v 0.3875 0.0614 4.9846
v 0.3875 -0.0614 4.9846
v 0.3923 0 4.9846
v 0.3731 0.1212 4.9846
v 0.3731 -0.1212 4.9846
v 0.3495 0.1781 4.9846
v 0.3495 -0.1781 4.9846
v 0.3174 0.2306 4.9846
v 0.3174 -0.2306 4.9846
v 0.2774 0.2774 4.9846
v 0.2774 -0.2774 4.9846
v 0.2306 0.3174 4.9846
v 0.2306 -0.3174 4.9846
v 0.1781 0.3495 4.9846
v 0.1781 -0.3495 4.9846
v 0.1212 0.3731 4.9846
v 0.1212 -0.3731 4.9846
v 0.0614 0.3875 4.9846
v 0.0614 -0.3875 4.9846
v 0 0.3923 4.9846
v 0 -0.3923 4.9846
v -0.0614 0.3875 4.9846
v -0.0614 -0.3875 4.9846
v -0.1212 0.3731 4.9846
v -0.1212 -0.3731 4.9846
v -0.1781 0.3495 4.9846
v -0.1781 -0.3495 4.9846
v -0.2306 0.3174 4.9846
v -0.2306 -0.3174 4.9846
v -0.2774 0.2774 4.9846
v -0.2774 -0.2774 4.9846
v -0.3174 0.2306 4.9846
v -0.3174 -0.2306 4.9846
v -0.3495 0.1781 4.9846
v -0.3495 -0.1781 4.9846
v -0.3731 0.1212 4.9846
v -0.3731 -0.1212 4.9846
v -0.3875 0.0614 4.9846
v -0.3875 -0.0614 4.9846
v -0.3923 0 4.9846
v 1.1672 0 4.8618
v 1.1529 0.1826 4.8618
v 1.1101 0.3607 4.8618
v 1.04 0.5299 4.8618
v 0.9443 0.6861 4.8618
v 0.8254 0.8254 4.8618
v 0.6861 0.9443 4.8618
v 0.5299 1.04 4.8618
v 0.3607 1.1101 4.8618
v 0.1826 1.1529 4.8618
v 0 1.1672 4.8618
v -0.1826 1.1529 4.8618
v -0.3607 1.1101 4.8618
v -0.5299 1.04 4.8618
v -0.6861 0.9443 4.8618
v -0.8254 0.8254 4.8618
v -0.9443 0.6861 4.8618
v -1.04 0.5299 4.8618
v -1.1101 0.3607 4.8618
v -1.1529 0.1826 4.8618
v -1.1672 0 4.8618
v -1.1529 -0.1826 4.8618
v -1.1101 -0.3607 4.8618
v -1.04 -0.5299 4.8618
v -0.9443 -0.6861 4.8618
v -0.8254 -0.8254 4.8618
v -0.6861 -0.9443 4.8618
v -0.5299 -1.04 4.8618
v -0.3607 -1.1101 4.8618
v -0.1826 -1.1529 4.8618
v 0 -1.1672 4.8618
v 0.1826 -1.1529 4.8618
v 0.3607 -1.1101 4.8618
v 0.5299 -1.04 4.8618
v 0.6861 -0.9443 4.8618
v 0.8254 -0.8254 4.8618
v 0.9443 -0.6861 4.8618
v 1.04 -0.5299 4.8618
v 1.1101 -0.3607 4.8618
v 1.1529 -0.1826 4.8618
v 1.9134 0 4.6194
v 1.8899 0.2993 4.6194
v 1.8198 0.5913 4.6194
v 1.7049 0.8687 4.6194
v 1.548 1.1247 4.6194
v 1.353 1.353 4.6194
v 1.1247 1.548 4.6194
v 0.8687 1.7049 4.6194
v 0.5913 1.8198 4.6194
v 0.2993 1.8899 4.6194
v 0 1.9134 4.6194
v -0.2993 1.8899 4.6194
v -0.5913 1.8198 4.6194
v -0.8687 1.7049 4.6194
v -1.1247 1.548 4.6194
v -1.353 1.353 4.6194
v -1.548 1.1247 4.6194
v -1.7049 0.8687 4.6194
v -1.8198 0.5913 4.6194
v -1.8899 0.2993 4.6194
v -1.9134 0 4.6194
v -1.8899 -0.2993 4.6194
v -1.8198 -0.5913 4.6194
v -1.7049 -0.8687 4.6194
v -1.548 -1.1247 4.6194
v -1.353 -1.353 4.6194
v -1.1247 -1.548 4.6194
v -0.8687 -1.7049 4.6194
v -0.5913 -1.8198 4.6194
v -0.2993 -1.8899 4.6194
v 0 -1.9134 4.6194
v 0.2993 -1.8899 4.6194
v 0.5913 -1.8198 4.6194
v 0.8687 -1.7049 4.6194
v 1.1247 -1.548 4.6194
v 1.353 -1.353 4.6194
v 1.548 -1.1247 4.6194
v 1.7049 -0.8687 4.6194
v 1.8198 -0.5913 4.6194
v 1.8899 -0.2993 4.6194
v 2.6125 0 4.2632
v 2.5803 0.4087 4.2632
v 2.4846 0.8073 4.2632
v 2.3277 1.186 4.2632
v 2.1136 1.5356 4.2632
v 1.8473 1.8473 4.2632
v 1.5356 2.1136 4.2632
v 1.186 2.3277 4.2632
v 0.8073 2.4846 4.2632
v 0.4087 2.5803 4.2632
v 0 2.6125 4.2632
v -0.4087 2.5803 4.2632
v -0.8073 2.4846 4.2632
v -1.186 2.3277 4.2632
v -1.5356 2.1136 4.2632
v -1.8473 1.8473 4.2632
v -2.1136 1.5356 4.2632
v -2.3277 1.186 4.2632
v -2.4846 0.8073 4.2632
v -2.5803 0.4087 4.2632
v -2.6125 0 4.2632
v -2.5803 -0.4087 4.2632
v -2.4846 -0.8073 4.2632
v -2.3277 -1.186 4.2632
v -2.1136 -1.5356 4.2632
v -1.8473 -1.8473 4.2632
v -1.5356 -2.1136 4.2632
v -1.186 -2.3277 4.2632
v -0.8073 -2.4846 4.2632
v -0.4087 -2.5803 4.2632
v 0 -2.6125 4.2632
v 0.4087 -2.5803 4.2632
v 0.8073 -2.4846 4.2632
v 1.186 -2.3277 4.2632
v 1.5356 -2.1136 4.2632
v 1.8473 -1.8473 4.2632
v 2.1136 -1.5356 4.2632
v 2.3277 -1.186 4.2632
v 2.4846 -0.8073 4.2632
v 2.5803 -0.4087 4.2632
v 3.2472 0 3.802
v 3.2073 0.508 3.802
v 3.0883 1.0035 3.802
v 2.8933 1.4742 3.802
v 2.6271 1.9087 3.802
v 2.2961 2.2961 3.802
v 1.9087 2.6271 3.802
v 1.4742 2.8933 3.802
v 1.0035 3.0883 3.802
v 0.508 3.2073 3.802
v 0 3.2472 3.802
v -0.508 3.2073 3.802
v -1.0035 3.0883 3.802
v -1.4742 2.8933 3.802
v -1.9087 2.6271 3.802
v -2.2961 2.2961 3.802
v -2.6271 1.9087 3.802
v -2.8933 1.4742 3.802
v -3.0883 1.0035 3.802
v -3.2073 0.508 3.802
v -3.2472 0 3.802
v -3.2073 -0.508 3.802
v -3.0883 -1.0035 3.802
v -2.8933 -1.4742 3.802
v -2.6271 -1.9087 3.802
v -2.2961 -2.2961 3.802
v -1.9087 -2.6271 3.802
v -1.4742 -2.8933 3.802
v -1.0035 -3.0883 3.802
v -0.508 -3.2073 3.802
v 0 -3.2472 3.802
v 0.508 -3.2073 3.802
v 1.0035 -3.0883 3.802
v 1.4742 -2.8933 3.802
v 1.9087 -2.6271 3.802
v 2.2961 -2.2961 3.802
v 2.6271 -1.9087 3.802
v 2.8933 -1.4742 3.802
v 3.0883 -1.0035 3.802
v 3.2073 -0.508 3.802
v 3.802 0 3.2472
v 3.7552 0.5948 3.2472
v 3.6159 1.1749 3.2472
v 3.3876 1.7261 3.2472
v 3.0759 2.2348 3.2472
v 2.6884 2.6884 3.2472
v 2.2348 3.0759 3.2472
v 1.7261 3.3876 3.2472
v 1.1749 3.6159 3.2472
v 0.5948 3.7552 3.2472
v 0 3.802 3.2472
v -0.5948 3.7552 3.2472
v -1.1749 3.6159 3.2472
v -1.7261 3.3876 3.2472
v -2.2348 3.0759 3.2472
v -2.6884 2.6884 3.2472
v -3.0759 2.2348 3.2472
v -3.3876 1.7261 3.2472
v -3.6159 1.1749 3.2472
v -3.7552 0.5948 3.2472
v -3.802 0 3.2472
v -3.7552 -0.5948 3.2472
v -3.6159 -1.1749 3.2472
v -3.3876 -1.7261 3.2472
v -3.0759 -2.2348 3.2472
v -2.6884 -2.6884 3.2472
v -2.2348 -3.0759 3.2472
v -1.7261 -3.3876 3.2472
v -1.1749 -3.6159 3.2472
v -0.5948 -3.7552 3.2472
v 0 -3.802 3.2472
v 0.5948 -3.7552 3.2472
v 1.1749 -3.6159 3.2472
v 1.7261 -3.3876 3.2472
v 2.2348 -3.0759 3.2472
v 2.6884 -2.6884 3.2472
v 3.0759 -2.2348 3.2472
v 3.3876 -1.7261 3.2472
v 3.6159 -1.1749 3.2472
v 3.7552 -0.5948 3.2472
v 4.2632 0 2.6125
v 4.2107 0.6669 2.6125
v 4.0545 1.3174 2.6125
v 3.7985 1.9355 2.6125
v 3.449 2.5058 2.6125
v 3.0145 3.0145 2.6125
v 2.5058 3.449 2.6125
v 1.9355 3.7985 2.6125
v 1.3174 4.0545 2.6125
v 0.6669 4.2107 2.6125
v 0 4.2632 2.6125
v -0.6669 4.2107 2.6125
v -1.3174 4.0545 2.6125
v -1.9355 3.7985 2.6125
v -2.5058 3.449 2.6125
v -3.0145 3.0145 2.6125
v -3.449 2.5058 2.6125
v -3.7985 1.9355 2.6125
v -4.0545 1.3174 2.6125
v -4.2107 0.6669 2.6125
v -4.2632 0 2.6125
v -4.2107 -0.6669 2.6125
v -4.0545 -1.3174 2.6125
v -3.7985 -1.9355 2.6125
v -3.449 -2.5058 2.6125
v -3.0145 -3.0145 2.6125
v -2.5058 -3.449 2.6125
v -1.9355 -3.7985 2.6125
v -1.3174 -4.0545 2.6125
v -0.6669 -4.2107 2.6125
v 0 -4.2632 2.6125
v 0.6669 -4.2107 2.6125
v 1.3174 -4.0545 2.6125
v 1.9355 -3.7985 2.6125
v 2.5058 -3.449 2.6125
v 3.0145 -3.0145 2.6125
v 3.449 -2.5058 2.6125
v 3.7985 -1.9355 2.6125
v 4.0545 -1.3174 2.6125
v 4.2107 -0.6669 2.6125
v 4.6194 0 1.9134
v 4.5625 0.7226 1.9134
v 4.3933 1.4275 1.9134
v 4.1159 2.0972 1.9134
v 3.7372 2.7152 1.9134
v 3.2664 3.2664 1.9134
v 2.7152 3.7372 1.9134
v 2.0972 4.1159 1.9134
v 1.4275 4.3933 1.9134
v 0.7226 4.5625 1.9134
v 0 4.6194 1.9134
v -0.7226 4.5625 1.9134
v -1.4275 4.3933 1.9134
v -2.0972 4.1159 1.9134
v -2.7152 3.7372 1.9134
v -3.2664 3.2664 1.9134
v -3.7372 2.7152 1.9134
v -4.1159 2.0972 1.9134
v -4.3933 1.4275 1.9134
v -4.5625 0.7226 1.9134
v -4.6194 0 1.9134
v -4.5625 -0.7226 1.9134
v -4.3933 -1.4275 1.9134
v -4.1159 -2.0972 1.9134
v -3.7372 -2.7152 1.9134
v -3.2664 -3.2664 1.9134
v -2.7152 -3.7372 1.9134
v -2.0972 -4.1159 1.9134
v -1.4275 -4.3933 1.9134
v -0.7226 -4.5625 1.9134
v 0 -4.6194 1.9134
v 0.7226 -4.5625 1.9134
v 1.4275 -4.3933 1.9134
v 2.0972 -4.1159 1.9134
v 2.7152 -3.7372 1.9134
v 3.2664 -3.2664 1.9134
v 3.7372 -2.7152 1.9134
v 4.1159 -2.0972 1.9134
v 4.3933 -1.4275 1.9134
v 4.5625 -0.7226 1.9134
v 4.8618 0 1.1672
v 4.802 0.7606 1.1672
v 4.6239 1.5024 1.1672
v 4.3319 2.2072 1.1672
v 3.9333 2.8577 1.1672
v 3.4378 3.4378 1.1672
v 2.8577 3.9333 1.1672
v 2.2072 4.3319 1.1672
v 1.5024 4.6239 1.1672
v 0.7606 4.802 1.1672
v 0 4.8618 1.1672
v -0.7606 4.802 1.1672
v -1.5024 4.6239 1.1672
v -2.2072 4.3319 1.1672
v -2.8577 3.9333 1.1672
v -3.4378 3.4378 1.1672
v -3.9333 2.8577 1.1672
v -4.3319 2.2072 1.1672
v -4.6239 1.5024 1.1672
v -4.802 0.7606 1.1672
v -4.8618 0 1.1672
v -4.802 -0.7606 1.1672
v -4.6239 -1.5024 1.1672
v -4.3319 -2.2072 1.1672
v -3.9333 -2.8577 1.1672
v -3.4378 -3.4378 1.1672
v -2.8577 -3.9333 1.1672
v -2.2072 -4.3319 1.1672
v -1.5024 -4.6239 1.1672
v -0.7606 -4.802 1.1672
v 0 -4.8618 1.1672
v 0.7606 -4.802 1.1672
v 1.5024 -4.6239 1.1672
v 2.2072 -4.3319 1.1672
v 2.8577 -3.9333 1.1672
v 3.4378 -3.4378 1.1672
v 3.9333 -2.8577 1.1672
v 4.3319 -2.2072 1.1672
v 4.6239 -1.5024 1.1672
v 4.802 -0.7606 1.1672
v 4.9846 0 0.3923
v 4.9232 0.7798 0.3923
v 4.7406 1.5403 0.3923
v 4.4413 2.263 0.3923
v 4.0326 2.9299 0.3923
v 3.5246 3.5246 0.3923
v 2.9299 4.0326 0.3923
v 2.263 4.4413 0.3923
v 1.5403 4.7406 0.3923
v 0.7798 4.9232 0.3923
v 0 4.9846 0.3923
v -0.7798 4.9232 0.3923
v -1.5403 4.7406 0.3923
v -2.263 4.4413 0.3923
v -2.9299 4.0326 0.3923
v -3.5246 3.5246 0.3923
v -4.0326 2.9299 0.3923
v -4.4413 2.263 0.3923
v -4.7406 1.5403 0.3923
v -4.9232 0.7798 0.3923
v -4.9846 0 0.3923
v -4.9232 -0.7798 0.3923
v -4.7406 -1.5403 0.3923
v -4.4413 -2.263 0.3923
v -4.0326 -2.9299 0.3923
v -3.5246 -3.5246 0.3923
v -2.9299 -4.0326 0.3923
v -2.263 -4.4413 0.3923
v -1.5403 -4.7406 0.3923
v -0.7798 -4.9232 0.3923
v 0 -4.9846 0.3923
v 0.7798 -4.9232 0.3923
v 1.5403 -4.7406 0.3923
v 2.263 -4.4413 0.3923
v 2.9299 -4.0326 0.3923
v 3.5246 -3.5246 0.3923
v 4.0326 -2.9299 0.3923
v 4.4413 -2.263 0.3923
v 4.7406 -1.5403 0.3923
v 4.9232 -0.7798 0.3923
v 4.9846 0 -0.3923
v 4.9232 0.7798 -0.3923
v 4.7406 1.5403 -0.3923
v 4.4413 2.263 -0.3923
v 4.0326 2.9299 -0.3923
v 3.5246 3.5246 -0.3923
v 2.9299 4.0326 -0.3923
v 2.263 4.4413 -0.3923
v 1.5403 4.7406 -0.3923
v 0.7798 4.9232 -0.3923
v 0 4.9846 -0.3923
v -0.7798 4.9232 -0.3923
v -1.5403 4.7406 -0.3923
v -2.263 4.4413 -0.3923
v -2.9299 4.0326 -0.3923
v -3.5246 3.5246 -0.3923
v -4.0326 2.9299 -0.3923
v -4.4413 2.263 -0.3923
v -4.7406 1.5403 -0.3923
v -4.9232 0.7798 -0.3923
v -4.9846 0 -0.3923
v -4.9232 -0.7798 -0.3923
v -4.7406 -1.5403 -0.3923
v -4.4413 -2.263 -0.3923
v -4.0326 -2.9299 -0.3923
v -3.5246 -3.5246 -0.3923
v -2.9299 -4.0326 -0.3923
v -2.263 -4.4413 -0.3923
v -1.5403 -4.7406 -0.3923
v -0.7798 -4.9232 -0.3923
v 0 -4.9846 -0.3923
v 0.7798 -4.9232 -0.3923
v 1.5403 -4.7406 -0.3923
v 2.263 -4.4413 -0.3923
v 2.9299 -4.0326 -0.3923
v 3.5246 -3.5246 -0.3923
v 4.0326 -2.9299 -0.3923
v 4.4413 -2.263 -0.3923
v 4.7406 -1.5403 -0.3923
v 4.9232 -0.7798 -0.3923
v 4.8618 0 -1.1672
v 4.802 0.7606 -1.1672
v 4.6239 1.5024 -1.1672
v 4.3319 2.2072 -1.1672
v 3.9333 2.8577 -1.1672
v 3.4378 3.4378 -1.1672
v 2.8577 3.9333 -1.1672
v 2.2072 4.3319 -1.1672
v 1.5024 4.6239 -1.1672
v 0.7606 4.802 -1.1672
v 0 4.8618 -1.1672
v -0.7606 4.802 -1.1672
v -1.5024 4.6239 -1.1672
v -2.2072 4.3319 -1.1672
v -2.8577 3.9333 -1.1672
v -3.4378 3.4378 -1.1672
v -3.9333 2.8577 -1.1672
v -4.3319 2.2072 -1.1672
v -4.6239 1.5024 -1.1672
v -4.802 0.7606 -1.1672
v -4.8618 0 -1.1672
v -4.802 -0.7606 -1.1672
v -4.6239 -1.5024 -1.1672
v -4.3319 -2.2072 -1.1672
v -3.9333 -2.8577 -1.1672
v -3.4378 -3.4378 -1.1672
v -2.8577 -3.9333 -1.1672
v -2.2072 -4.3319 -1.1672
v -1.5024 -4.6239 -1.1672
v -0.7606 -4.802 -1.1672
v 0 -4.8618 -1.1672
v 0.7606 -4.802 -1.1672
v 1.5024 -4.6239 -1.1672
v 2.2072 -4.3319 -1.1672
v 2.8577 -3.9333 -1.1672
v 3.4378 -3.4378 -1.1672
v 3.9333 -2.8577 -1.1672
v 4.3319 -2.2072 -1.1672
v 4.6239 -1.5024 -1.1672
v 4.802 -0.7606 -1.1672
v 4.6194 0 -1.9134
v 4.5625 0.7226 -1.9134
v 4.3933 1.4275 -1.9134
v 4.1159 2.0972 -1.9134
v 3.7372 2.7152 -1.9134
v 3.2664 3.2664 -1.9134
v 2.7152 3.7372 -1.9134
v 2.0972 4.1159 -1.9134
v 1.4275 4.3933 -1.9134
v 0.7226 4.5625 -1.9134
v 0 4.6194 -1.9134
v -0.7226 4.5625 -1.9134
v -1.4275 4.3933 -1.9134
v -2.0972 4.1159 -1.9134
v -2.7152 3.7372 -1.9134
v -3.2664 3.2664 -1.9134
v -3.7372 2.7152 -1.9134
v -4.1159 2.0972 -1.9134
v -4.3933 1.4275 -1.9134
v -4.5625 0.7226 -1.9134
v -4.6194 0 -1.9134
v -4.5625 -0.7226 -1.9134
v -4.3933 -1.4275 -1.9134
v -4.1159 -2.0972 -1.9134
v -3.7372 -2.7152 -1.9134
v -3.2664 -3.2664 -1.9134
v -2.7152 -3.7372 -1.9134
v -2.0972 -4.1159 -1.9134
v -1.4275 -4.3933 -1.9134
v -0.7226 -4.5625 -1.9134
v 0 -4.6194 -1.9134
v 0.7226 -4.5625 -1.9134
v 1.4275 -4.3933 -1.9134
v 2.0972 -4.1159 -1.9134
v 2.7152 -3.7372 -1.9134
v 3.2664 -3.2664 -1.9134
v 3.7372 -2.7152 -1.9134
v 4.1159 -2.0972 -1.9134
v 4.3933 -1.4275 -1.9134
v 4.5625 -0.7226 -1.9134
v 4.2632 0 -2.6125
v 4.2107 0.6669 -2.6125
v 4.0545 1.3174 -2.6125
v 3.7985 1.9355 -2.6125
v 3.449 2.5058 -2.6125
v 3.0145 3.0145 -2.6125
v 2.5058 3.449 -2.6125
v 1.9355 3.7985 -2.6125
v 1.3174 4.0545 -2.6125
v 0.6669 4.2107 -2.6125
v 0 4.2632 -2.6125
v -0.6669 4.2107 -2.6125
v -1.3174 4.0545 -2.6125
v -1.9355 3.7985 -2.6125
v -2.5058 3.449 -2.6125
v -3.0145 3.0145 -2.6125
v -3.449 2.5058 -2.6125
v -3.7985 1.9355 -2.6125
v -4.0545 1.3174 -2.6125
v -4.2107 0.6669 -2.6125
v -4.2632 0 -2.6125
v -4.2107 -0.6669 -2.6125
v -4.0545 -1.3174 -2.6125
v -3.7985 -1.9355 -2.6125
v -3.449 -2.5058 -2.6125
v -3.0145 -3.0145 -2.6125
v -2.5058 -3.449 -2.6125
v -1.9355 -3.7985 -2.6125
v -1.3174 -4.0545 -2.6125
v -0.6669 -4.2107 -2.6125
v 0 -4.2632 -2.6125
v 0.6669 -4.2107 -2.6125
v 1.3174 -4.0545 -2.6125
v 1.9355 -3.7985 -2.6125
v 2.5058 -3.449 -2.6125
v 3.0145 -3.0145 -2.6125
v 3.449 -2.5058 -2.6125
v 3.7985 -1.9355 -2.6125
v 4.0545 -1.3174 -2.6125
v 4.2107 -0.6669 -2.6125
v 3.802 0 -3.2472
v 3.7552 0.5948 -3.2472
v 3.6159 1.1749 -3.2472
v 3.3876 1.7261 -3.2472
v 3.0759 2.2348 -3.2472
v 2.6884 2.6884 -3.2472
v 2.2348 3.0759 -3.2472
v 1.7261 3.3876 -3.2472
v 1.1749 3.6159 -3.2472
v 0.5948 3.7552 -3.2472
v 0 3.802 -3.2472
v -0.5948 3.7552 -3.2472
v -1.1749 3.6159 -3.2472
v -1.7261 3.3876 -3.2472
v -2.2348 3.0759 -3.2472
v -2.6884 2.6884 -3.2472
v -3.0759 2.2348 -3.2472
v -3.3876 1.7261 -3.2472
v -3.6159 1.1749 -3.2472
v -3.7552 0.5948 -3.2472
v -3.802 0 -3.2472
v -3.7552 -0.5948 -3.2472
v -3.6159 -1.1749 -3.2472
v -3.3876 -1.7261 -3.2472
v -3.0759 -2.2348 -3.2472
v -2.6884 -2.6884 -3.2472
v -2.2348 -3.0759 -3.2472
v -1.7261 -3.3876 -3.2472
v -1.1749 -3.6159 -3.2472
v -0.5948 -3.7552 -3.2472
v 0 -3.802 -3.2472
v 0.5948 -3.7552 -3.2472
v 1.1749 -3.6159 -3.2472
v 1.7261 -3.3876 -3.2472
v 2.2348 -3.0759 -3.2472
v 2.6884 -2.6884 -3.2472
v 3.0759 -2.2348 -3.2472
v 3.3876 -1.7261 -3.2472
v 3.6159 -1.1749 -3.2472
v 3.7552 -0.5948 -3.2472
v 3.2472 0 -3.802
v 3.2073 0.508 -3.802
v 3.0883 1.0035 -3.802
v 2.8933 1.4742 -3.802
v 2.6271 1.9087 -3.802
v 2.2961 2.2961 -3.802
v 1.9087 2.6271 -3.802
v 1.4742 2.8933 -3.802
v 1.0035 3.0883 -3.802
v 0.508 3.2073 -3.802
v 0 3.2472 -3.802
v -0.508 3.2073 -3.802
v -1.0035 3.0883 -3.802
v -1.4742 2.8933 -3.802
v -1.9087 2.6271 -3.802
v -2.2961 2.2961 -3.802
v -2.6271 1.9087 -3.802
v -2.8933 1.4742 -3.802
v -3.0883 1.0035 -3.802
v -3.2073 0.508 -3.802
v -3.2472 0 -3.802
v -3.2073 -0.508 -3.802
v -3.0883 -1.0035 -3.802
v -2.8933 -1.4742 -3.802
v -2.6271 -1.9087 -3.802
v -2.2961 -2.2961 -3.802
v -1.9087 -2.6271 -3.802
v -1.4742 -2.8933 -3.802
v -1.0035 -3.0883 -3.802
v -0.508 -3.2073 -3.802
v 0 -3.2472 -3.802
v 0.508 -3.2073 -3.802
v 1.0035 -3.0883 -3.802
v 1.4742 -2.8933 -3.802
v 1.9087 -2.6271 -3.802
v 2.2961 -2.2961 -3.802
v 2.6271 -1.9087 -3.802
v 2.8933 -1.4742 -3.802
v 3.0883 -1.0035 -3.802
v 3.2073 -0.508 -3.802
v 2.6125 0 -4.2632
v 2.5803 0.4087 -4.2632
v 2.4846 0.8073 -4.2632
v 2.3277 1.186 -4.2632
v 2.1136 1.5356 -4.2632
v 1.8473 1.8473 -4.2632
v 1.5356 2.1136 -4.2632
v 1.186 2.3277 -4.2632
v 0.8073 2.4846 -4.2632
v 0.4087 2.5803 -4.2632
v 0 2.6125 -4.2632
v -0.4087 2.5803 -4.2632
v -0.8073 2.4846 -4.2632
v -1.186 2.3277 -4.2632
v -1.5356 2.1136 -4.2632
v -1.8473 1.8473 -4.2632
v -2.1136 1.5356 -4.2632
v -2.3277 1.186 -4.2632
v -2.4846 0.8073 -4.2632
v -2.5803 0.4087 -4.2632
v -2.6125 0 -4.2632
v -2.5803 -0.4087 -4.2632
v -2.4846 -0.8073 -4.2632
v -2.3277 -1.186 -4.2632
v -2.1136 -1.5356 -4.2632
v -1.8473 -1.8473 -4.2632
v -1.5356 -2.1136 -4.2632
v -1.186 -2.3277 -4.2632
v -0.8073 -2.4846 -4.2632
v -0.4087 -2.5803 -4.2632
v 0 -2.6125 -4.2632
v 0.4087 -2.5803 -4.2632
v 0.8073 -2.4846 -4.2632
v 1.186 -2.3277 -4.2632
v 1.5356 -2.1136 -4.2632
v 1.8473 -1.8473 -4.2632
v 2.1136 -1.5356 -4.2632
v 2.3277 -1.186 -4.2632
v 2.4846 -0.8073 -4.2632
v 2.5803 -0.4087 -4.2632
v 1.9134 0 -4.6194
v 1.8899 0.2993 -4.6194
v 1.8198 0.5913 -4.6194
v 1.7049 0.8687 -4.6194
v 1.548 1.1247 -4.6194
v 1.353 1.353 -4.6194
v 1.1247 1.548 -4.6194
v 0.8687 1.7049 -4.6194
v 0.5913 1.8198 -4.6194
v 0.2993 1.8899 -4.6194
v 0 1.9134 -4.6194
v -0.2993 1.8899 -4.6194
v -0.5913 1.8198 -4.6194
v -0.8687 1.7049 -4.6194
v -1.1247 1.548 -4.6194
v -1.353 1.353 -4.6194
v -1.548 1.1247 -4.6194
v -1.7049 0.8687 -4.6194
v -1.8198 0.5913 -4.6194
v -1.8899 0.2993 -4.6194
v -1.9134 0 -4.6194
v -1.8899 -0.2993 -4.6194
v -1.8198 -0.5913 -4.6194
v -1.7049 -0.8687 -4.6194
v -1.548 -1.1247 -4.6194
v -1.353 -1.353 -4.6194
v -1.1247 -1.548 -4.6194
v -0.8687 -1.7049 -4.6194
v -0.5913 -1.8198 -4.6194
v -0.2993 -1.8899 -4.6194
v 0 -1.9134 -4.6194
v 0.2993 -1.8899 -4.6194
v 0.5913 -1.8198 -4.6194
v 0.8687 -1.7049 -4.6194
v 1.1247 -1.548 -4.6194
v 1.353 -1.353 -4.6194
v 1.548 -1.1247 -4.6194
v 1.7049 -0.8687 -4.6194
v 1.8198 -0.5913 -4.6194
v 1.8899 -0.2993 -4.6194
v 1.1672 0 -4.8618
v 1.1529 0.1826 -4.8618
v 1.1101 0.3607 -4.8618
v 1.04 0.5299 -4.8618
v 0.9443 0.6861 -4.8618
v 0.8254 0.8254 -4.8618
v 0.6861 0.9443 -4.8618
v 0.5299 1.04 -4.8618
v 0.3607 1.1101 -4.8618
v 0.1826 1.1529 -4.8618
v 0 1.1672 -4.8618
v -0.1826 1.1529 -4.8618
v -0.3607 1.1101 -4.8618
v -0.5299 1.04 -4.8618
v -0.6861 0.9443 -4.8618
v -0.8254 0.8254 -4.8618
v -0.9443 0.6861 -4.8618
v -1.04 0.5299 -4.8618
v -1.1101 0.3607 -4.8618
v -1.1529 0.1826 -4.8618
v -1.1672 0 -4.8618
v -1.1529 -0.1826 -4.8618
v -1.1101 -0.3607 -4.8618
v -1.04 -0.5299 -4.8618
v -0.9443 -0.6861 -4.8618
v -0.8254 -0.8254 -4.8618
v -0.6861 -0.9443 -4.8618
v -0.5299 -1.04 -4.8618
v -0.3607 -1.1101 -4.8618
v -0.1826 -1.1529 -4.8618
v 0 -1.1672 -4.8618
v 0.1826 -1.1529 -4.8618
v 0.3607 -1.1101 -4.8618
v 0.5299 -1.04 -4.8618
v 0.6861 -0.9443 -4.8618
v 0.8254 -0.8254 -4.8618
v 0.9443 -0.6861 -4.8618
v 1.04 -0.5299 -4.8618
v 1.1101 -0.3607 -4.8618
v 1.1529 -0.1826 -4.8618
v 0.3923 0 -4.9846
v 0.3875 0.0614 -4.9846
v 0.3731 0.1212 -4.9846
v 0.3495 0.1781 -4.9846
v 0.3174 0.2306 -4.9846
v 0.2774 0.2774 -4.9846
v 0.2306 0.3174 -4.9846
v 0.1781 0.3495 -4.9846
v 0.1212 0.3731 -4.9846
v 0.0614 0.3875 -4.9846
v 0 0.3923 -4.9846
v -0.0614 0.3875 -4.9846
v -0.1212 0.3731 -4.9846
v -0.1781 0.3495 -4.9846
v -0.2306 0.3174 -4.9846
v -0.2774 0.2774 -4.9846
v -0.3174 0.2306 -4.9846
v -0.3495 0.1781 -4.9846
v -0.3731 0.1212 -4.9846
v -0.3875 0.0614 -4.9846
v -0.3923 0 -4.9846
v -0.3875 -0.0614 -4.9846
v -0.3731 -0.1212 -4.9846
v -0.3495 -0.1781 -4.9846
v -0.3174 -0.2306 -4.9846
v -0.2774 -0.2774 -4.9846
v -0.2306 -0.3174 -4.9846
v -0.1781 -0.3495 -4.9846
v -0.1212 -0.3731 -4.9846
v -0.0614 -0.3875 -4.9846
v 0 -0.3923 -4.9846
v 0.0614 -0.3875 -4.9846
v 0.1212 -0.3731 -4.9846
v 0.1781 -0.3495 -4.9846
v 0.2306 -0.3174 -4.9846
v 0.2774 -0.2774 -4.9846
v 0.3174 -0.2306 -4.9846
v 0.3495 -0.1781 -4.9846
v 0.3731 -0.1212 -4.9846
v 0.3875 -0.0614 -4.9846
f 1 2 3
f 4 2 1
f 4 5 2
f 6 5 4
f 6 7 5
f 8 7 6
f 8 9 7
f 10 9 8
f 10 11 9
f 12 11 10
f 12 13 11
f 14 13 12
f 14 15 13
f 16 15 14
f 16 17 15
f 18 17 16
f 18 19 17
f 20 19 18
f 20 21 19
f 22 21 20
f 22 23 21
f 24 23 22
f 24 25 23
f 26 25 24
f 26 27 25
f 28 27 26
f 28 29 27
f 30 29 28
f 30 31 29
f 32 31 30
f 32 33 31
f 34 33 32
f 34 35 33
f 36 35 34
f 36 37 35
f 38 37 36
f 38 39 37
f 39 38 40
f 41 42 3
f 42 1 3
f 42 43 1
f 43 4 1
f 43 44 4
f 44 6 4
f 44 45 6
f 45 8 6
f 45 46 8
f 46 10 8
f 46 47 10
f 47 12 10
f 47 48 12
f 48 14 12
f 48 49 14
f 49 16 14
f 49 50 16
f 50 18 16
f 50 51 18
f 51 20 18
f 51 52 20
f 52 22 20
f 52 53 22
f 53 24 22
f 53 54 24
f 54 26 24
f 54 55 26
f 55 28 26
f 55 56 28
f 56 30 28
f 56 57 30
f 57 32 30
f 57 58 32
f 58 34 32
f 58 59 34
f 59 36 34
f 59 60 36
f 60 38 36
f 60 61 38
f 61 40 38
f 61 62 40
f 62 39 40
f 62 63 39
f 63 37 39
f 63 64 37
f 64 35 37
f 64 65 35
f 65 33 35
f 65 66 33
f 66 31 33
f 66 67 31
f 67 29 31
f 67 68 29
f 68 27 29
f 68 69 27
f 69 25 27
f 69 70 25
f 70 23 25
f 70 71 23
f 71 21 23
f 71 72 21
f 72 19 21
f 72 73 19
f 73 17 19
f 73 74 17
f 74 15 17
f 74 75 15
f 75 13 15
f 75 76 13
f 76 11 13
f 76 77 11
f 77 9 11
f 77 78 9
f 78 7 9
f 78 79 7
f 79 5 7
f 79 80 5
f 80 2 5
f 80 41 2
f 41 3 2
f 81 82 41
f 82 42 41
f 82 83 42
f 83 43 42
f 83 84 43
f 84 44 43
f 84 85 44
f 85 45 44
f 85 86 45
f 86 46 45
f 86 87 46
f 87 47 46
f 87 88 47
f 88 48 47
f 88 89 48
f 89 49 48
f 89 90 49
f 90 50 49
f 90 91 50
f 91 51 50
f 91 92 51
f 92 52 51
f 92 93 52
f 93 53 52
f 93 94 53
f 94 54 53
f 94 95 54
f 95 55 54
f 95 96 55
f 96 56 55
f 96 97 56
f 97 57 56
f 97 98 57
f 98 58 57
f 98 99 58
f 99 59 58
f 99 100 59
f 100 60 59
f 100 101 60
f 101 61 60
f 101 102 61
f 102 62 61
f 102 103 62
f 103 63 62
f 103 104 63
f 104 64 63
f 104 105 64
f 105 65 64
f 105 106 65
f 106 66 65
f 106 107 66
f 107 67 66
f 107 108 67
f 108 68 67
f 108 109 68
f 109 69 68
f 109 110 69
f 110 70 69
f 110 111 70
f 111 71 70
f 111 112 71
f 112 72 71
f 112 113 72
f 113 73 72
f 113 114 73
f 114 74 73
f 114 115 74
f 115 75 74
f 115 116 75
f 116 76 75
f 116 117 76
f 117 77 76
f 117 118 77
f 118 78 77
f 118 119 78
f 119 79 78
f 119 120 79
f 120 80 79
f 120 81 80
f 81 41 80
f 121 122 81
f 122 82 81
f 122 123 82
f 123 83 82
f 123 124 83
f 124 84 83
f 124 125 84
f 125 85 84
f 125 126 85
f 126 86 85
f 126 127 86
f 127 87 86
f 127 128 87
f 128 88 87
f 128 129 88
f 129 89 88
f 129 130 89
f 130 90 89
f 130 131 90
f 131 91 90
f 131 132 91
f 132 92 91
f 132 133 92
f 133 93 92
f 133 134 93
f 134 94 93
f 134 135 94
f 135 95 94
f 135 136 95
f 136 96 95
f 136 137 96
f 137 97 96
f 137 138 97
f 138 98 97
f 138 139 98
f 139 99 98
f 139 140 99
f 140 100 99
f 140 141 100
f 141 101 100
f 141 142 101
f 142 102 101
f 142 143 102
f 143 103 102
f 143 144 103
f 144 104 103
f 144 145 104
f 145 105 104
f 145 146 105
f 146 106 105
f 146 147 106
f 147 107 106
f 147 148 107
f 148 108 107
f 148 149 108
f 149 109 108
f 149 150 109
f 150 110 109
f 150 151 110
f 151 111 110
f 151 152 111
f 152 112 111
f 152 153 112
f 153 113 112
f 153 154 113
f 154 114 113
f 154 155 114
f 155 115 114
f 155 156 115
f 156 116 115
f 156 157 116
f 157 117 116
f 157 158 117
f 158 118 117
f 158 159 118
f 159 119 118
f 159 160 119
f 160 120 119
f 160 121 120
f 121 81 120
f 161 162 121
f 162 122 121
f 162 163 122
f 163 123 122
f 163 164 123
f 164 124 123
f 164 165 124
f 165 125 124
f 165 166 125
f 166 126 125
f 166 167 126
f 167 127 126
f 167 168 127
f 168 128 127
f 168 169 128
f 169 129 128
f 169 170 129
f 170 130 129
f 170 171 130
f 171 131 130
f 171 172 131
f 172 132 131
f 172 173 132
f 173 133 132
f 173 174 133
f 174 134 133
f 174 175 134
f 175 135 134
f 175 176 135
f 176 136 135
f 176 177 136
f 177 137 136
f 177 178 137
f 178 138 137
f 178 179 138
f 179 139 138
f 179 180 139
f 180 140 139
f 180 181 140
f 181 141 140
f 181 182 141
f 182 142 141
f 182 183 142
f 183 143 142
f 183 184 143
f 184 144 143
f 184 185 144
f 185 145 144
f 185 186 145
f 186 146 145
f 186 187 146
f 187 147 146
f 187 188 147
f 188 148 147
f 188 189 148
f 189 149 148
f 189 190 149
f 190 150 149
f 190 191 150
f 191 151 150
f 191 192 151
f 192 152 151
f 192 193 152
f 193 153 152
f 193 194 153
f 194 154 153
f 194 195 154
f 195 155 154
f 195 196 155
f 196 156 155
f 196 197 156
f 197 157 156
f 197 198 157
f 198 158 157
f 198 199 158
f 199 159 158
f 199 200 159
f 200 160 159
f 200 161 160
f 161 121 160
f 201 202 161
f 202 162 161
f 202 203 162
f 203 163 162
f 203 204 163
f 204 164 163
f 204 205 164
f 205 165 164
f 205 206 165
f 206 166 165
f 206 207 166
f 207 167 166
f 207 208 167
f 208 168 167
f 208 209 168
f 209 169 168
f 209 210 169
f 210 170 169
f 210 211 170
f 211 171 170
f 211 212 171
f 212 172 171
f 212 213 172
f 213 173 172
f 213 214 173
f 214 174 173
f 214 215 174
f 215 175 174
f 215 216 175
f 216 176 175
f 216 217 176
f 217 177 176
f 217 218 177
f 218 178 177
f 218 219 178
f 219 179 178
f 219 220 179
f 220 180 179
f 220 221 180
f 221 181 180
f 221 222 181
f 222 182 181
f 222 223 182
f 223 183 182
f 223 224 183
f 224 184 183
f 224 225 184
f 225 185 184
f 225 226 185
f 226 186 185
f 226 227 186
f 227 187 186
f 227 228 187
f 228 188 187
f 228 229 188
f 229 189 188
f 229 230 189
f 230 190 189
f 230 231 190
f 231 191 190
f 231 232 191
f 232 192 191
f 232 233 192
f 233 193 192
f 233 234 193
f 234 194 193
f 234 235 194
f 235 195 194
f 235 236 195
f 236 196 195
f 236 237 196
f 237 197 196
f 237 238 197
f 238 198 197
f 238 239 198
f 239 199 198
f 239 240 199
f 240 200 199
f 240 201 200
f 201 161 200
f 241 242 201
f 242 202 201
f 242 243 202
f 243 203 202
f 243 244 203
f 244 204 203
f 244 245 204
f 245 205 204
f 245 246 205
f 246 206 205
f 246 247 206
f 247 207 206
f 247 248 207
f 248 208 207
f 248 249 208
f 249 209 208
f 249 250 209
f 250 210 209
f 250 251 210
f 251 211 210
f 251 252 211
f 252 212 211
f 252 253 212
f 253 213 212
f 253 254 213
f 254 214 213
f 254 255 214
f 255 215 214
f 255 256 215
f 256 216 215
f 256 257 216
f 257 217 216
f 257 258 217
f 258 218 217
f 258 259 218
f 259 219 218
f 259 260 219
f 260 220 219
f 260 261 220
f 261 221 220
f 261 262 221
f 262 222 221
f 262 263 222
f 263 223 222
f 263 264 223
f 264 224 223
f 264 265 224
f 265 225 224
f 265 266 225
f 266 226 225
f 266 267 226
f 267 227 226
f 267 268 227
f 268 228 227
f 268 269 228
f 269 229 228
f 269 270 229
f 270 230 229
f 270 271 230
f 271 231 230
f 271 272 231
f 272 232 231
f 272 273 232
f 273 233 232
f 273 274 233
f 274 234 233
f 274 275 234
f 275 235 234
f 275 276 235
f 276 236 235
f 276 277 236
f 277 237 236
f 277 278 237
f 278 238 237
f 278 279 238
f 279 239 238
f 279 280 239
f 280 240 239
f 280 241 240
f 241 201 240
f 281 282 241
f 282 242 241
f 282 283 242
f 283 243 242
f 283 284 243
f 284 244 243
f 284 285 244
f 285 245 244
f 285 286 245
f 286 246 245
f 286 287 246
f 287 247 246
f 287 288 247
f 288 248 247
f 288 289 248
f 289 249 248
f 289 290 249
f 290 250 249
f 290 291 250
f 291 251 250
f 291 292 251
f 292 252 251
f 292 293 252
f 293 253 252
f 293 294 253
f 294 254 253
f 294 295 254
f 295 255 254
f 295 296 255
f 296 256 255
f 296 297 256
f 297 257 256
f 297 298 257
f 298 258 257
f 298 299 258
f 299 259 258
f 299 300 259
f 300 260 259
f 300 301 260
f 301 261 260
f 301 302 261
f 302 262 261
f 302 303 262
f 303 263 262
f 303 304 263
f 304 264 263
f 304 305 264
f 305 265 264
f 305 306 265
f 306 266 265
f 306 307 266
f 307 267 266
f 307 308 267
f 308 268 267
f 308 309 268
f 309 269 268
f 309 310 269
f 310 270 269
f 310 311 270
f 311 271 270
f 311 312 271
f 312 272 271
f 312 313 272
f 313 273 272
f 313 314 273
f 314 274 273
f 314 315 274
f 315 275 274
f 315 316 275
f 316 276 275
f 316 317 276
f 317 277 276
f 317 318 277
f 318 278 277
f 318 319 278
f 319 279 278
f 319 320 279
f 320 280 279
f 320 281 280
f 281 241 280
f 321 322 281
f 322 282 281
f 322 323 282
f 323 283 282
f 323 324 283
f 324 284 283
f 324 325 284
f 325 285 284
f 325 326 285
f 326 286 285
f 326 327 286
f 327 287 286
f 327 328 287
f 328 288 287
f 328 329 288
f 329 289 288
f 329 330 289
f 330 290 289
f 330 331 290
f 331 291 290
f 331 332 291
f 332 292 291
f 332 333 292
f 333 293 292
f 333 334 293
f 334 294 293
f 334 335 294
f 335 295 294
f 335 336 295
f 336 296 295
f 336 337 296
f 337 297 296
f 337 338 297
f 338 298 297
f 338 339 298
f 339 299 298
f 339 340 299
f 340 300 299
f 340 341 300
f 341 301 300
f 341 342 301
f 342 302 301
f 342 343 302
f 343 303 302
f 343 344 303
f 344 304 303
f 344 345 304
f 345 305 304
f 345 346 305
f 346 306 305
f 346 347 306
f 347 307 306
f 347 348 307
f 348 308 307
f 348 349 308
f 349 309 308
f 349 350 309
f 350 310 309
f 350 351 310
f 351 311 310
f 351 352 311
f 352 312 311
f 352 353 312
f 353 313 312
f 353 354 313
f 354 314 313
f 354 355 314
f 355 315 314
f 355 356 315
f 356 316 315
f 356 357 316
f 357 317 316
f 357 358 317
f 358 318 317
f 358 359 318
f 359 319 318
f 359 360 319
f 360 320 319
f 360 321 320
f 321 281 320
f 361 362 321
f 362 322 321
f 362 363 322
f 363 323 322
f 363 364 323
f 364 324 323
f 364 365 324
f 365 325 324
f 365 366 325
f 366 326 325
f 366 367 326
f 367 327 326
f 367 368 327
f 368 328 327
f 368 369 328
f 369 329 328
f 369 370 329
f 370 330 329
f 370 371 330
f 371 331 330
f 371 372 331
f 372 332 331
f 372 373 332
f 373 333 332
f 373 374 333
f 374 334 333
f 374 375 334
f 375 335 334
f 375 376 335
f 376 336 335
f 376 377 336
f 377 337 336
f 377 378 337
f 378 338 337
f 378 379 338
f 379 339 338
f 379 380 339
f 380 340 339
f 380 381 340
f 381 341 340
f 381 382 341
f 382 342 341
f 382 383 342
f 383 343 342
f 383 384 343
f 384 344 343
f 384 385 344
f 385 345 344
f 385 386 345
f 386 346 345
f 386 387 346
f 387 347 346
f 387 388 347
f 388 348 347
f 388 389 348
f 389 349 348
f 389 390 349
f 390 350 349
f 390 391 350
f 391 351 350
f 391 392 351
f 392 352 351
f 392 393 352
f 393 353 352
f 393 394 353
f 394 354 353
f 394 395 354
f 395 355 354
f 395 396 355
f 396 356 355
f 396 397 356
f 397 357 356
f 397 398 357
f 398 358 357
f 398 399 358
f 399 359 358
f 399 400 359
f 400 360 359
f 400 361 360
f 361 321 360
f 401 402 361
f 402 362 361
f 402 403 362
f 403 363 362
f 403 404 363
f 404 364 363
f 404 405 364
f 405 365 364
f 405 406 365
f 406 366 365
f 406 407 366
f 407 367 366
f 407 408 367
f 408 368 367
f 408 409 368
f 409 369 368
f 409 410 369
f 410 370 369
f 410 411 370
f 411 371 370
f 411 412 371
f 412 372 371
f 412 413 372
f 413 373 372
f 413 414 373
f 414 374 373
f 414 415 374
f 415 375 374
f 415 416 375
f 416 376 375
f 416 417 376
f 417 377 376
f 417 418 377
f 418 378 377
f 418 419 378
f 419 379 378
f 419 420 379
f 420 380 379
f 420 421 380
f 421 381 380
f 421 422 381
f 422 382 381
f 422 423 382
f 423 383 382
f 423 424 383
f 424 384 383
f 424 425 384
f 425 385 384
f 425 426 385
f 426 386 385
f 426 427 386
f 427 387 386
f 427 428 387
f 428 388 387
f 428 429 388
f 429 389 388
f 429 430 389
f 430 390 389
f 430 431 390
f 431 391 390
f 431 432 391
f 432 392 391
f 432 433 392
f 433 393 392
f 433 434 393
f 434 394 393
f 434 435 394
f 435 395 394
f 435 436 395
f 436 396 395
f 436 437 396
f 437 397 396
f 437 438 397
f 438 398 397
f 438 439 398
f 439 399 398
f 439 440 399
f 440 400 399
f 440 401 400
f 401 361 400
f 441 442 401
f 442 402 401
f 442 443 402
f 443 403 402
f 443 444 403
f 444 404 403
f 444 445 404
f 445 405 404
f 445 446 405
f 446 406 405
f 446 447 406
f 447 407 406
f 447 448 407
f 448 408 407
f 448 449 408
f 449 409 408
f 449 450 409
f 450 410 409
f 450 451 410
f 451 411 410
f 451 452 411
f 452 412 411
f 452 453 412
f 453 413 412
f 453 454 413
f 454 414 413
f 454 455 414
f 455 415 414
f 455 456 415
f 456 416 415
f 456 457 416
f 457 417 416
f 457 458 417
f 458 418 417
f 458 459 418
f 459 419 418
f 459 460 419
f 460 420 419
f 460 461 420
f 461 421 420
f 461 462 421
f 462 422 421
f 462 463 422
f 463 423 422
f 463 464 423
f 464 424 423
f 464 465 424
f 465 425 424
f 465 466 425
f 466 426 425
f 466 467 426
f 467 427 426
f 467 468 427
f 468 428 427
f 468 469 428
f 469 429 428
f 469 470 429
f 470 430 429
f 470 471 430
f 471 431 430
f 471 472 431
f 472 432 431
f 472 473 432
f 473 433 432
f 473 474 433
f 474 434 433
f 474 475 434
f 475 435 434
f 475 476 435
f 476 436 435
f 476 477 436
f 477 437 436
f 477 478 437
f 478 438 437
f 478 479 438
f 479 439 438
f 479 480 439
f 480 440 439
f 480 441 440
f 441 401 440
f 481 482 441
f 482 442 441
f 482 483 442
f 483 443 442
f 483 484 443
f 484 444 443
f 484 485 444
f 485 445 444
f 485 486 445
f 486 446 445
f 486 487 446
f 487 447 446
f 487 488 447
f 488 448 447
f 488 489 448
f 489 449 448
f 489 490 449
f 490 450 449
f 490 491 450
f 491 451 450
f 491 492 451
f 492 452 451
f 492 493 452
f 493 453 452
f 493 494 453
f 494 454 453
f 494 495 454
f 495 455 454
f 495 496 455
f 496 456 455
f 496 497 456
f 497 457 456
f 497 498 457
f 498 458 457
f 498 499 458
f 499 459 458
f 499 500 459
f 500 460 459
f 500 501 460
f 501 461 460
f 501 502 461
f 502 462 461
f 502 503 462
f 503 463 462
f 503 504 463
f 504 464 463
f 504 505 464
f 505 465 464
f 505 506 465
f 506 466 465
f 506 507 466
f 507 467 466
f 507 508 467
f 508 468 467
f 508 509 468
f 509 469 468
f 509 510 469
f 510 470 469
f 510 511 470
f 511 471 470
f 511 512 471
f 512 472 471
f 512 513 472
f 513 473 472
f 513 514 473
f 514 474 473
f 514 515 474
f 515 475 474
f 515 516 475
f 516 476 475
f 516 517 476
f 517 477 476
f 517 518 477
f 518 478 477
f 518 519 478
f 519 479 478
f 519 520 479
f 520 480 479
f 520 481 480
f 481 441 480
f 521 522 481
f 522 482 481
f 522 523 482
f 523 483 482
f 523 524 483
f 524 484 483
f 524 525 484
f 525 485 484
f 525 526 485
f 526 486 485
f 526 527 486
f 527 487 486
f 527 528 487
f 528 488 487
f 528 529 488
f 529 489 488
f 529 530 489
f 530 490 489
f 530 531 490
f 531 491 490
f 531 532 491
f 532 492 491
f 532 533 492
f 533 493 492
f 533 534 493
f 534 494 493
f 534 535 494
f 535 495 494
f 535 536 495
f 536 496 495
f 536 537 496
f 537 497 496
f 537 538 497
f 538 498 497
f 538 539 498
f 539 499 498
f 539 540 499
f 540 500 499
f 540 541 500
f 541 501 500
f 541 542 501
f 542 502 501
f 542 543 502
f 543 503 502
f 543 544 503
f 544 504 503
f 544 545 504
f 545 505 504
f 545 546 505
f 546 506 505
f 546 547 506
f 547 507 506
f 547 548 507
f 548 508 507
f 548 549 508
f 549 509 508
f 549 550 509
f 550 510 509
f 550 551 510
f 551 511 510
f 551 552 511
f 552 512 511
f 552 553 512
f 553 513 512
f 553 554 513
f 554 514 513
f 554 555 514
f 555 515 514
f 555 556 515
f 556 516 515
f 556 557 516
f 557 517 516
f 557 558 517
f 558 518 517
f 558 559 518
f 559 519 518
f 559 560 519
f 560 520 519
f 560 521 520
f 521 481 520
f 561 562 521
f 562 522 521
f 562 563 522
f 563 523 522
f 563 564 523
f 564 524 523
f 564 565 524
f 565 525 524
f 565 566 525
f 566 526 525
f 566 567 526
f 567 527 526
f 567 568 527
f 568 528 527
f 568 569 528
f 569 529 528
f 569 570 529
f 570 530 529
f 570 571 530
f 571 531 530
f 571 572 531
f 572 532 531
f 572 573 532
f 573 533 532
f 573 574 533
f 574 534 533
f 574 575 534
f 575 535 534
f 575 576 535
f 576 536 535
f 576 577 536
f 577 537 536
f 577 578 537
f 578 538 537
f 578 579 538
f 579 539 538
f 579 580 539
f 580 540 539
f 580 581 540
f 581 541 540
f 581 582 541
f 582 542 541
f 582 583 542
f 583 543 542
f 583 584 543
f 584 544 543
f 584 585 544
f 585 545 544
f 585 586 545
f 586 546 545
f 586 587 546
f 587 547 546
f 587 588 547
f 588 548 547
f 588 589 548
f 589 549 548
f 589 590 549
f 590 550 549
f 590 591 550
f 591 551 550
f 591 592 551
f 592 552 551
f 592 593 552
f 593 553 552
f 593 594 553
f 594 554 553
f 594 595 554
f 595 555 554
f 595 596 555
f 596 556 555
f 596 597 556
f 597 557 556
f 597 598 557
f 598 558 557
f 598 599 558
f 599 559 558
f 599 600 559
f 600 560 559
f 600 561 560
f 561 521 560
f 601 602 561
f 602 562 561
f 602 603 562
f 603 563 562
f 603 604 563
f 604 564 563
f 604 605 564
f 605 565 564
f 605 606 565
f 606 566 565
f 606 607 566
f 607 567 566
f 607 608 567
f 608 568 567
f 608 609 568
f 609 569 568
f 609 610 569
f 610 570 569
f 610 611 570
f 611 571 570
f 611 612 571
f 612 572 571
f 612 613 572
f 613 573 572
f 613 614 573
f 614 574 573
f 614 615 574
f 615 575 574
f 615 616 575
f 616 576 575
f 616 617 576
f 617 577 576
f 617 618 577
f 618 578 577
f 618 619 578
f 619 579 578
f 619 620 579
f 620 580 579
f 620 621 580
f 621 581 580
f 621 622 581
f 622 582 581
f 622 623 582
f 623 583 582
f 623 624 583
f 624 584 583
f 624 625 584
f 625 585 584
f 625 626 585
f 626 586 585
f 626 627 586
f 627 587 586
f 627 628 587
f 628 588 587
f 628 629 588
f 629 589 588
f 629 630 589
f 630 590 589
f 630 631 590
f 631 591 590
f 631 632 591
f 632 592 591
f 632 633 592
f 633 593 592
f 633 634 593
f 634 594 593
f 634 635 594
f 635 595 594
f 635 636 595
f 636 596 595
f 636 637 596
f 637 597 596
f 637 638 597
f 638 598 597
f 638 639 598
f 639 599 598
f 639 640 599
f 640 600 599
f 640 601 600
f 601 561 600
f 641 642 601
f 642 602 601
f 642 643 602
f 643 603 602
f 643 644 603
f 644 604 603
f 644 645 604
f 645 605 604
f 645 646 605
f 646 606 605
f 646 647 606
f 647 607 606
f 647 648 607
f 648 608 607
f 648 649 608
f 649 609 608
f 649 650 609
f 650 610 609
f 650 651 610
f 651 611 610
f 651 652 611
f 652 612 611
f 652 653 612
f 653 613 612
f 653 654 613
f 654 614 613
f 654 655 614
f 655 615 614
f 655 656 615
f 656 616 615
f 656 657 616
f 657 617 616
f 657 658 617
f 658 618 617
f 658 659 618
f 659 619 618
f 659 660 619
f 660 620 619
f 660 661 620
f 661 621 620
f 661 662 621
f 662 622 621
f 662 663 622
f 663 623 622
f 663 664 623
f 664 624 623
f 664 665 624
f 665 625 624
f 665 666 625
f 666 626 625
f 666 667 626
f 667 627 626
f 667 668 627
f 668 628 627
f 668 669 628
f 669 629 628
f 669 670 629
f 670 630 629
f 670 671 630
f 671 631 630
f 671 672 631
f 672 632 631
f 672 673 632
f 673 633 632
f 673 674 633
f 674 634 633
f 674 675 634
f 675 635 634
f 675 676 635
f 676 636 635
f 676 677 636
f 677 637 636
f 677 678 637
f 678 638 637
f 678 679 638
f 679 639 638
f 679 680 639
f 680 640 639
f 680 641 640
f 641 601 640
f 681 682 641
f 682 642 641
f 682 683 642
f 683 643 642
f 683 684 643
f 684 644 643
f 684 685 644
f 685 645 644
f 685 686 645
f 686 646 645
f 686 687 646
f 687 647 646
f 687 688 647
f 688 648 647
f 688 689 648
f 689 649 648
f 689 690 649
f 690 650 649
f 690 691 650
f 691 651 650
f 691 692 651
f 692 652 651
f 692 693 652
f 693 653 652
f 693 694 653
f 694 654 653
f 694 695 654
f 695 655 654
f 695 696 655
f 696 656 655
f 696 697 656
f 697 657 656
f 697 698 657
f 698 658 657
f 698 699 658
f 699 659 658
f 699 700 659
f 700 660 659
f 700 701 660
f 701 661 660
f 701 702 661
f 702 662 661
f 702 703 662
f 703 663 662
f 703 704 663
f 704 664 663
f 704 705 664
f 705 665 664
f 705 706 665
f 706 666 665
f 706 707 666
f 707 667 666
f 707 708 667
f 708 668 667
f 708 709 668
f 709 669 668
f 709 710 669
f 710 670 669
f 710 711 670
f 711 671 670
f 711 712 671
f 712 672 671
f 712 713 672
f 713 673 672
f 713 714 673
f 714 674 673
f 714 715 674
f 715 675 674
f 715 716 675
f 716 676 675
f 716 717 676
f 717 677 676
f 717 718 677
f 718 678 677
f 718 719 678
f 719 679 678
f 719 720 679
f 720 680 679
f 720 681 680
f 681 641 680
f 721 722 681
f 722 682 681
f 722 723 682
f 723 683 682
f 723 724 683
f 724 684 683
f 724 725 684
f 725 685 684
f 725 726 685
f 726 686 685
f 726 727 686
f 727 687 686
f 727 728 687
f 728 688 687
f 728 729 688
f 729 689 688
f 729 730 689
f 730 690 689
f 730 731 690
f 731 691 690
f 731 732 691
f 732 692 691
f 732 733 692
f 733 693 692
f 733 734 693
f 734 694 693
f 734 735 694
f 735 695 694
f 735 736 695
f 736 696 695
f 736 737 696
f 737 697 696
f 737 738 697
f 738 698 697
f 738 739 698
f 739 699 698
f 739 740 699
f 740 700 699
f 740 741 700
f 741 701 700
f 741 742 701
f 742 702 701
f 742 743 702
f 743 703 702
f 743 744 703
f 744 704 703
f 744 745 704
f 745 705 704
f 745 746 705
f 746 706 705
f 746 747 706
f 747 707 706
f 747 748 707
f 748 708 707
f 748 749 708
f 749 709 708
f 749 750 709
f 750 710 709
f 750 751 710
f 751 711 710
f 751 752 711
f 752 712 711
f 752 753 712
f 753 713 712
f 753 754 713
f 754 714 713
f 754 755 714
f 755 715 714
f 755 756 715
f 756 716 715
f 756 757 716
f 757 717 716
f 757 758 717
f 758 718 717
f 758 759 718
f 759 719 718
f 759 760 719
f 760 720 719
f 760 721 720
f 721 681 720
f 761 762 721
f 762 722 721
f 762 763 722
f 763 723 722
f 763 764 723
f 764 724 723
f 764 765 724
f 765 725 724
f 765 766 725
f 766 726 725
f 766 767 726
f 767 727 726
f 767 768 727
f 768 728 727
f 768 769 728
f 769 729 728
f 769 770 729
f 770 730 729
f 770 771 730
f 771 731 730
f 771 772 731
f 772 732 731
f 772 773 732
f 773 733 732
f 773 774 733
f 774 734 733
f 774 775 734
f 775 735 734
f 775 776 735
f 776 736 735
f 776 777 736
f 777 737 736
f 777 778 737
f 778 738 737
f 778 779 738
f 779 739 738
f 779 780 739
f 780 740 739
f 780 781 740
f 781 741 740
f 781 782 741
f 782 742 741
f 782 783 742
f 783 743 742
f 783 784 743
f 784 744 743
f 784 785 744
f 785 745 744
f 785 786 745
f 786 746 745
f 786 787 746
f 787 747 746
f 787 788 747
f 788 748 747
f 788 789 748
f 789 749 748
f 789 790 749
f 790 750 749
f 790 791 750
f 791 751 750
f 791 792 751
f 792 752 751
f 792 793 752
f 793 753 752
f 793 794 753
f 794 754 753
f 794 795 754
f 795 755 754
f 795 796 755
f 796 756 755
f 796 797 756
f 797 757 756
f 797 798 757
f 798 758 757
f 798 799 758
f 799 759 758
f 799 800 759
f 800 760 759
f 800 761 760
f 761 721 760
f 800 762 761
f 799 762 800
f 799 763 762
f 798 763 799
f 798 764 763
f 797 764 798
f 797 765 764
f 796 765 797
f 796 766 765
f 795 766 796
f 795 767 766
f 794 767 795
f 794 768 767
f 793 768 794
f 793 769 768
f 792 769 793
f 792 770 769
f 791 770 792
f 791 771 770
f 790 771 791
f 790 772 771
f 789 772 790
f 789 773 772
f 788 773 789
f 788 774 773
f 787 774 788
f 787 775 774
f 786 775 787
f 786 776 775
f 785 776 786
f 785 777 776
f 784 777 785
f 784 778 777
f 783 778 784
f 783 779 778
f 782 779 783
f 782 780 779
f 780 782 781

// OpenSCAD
radius = 5;
detail = 40;
$fn = detail;

sphere(r = radius);
